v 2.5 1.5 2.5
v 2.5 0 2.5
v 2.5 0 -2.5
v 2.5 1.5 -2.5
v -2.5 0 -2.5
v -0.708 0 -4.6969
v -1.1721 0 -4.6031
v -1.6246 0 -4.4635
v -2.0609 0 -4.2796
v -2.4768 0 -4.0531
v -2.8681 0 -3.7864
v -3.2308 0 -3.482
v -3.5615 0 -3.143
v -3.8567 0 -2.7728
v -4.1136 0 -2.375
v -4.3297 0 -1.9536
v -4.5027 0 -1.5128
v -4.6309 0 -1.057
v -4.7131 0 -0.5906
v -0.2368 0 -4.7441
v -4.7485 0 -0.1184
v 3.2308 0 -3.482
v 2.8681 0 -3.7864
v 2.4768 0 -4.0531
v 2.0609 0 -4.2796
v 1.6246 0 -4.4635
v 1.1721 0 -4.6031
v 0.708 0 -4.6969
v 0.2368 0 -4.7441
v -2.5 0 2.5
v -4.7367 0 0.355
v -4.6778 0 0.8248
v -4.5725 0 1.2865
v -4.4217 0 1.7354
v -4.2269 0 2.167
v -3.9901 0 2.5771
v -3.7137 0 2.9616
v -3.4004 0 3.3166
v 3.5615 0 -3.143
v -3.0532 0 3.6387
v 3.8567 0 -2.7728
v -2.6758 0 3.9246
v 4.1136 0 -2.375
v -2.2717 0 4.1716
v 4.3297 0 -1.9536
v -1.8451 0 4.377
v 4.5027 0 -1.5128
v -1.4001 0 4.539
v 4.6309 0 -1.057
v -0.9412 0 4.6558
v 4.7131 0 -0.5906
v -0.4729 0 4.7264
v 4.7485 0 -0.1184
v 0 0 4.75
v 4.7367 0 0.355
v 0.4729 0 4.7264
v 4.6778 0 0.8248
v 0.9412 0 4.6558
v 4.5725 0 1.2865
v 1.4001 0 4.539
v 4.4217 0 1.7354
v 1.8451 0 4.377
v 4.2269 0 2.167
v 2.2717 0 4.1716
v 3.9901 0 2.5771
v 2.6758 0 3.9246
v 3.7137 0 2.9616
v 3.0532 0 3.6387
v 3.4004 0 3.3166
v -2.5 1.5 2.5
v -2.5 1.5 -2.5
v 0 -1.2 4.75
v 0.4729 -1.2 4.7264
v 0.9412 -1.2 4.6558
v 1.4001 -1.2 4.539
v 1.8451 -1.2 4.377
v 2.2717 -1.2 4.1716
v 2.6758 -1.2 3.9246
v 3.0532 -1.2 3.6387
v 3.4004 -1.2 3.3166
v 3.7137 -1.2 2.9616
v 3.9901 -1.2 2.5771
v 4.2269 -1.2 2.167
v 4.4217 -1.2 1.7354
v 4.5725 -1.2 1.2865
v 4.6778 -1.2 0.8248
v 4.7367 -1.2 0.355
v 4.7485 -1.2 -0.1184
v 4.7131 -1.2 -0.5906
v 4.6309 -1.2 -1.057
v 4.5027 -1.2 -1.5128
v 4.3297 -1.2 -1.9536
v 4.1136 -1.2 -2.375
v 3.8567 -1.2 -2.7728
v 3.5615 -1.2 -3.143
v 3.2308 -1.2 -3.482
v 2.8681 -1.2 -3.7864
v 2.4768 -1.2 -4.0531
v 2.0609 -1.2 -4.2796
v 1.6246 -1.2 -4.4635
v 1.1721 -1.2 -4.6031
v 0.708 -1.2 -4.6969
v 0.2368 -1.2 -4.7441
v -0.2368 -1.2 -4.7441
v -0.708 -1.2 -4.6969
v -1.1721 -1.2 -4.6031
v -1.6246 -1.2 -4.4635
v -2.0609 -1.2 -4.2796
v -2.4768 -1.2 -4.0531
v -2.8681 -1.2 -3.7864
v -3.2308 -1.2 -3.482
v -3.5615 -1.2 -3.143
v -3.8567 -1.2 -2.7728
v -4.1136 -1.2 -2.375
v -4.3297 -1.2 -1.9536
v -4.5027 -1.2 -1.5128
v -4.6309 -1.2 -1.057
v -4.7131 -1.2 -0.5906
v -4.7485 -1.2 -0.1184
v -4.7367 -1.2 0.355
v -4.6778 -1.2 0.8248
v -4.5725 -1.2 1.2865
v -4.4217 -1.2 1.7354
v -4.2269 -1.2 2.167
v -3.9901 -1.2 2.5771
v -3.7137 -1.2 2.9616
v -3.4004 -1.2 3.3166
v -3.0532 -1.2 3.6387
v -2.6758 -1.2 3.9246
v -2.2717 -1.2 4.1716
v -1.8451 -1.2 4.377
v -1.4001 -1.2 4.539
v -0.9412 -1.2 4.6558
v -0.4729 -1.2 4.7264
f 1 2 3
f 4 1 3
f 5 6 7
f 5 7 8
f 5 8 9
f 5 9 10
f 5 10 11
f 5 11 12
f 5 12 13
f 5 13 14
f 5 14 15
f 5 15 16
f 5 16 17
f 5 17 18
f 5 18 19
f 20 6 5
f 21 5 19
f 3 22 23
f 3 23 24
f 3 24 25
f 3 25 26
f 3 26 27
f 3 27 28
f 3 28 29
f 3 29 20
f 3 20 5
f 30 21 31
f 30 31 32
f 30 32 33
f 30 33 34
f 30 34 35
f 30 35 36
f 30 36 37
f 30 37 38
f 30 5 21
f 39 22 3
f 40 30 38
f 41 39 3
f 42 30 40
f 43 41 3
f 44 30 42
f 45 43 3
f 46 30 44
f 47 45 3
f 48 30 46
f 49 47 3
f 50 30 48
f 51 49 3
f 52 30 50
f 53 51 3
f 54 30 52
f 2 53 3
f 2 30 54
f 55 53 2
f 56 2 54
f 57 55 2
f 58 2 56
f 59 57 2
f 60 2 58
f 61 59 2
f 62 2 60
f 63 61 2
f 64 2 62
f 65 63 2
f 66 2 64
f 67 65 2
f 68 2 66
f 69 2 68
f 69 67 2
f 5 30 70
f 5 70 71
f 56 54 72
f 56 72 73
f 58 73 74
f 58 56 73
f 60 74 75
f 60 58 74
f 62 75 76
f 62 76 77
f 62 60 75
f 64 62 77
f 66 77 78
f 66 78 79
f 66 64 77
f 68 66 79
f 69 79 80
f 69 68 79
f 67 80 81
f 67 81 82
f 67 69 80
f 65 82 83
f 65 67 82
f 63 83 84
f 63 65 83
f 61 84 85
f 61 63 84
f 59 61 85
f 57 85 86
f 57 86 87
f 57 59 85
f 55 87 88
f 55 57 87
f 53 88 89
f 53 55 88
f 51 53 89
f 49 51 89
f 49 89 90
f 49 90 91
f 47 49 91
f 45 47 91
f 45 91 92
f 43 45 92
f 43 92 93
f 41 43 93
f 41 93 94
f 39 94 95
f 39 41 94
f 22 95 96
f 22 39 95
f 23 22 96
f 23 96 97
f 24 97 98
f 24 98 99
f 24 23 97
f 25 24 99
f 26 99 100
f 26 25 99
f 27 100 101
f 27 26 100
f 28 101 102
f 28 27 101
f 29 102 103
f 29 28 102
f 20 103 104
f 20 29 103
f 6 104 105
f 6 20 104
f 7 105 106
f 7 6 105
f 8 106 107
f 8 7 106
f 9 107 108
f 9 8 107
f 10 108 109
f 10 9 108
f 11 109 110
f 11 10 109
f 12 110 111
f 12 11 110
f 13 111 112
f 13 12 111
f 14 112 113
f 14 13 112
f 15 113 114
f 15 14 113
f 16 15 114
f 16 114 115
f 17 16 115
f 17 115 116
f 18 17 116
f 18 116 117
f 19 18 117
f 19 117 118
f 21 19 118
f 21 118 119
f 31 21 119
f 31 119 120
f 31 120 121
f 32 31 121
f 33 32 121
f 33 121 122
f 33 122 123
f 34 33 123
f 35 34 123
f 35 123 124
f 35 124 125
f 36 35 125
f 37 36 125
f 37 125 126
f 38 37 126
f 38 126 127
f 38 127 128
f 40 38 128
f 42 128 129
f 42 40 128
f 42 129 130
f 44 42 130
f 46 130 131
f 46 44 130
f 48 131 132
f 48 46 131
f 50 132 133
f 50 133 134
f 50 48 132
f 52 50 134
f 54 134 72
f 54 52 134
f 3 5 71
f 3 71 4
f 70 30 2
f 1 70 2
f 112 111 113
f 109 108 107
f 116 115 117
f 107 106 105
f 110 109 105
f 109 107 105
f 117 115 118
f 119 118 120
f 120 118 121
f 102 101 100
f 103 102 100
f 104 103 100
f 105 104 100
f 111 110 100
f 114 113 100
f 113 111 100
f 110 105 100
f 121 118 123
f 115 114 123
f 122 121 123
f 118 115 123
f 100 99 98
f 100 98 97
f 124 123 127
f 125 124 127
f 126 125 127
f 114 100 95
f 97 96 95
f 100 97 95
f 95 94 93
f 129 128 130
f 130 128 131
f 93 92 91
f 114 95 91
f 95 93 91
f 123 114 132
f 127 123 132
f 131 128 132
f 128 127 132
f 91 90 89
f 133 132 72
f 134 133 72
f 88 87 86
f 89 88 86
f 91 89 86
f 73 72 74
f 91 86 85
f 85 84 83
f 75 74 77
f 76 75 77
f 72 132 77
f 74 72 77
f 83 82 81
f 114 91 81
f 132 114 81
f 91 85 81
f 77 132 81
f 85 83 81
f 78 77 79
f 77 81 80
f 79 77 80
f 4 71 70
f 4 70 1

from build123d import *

# Parameters (mm, degrees)
SKETCH1_R           = 4.75
BOSS_EXTRUDE1_DEPTH = 1.2
SKETCH2_W           = 5
SKETCH2_H           = 5
BOSS_EXTRUDE2_DEPTH = 1.5


with BuildPart() as part:
    # Sketch1 → Boss-Extrude1 (new body)
    with BuildSketch(Plane(origin=(0, 0, 0), x_dir=(1, 0, 0), z_dir=(0, 1, 0))):
        with Locations(Location((0, 0, 0), (0, 0, 270))):
            Circle(SKETCH1_R)
    extrude(amount=-BOSS_EXTRUDE1_DEPTH)

    # Sketch2 → Boss-Extrude2 (add)
    with BuildSketch(Plane(origin=(0, 0, 0), x_dir=(1, 0, 0), z_dir=(0, 1, 0))):
        Rectangle(SKETCH2_W, SKETCH2_H)
    extrude(amount=BOSS_EXTRUDE2_DEPTH)


solid = part.part
